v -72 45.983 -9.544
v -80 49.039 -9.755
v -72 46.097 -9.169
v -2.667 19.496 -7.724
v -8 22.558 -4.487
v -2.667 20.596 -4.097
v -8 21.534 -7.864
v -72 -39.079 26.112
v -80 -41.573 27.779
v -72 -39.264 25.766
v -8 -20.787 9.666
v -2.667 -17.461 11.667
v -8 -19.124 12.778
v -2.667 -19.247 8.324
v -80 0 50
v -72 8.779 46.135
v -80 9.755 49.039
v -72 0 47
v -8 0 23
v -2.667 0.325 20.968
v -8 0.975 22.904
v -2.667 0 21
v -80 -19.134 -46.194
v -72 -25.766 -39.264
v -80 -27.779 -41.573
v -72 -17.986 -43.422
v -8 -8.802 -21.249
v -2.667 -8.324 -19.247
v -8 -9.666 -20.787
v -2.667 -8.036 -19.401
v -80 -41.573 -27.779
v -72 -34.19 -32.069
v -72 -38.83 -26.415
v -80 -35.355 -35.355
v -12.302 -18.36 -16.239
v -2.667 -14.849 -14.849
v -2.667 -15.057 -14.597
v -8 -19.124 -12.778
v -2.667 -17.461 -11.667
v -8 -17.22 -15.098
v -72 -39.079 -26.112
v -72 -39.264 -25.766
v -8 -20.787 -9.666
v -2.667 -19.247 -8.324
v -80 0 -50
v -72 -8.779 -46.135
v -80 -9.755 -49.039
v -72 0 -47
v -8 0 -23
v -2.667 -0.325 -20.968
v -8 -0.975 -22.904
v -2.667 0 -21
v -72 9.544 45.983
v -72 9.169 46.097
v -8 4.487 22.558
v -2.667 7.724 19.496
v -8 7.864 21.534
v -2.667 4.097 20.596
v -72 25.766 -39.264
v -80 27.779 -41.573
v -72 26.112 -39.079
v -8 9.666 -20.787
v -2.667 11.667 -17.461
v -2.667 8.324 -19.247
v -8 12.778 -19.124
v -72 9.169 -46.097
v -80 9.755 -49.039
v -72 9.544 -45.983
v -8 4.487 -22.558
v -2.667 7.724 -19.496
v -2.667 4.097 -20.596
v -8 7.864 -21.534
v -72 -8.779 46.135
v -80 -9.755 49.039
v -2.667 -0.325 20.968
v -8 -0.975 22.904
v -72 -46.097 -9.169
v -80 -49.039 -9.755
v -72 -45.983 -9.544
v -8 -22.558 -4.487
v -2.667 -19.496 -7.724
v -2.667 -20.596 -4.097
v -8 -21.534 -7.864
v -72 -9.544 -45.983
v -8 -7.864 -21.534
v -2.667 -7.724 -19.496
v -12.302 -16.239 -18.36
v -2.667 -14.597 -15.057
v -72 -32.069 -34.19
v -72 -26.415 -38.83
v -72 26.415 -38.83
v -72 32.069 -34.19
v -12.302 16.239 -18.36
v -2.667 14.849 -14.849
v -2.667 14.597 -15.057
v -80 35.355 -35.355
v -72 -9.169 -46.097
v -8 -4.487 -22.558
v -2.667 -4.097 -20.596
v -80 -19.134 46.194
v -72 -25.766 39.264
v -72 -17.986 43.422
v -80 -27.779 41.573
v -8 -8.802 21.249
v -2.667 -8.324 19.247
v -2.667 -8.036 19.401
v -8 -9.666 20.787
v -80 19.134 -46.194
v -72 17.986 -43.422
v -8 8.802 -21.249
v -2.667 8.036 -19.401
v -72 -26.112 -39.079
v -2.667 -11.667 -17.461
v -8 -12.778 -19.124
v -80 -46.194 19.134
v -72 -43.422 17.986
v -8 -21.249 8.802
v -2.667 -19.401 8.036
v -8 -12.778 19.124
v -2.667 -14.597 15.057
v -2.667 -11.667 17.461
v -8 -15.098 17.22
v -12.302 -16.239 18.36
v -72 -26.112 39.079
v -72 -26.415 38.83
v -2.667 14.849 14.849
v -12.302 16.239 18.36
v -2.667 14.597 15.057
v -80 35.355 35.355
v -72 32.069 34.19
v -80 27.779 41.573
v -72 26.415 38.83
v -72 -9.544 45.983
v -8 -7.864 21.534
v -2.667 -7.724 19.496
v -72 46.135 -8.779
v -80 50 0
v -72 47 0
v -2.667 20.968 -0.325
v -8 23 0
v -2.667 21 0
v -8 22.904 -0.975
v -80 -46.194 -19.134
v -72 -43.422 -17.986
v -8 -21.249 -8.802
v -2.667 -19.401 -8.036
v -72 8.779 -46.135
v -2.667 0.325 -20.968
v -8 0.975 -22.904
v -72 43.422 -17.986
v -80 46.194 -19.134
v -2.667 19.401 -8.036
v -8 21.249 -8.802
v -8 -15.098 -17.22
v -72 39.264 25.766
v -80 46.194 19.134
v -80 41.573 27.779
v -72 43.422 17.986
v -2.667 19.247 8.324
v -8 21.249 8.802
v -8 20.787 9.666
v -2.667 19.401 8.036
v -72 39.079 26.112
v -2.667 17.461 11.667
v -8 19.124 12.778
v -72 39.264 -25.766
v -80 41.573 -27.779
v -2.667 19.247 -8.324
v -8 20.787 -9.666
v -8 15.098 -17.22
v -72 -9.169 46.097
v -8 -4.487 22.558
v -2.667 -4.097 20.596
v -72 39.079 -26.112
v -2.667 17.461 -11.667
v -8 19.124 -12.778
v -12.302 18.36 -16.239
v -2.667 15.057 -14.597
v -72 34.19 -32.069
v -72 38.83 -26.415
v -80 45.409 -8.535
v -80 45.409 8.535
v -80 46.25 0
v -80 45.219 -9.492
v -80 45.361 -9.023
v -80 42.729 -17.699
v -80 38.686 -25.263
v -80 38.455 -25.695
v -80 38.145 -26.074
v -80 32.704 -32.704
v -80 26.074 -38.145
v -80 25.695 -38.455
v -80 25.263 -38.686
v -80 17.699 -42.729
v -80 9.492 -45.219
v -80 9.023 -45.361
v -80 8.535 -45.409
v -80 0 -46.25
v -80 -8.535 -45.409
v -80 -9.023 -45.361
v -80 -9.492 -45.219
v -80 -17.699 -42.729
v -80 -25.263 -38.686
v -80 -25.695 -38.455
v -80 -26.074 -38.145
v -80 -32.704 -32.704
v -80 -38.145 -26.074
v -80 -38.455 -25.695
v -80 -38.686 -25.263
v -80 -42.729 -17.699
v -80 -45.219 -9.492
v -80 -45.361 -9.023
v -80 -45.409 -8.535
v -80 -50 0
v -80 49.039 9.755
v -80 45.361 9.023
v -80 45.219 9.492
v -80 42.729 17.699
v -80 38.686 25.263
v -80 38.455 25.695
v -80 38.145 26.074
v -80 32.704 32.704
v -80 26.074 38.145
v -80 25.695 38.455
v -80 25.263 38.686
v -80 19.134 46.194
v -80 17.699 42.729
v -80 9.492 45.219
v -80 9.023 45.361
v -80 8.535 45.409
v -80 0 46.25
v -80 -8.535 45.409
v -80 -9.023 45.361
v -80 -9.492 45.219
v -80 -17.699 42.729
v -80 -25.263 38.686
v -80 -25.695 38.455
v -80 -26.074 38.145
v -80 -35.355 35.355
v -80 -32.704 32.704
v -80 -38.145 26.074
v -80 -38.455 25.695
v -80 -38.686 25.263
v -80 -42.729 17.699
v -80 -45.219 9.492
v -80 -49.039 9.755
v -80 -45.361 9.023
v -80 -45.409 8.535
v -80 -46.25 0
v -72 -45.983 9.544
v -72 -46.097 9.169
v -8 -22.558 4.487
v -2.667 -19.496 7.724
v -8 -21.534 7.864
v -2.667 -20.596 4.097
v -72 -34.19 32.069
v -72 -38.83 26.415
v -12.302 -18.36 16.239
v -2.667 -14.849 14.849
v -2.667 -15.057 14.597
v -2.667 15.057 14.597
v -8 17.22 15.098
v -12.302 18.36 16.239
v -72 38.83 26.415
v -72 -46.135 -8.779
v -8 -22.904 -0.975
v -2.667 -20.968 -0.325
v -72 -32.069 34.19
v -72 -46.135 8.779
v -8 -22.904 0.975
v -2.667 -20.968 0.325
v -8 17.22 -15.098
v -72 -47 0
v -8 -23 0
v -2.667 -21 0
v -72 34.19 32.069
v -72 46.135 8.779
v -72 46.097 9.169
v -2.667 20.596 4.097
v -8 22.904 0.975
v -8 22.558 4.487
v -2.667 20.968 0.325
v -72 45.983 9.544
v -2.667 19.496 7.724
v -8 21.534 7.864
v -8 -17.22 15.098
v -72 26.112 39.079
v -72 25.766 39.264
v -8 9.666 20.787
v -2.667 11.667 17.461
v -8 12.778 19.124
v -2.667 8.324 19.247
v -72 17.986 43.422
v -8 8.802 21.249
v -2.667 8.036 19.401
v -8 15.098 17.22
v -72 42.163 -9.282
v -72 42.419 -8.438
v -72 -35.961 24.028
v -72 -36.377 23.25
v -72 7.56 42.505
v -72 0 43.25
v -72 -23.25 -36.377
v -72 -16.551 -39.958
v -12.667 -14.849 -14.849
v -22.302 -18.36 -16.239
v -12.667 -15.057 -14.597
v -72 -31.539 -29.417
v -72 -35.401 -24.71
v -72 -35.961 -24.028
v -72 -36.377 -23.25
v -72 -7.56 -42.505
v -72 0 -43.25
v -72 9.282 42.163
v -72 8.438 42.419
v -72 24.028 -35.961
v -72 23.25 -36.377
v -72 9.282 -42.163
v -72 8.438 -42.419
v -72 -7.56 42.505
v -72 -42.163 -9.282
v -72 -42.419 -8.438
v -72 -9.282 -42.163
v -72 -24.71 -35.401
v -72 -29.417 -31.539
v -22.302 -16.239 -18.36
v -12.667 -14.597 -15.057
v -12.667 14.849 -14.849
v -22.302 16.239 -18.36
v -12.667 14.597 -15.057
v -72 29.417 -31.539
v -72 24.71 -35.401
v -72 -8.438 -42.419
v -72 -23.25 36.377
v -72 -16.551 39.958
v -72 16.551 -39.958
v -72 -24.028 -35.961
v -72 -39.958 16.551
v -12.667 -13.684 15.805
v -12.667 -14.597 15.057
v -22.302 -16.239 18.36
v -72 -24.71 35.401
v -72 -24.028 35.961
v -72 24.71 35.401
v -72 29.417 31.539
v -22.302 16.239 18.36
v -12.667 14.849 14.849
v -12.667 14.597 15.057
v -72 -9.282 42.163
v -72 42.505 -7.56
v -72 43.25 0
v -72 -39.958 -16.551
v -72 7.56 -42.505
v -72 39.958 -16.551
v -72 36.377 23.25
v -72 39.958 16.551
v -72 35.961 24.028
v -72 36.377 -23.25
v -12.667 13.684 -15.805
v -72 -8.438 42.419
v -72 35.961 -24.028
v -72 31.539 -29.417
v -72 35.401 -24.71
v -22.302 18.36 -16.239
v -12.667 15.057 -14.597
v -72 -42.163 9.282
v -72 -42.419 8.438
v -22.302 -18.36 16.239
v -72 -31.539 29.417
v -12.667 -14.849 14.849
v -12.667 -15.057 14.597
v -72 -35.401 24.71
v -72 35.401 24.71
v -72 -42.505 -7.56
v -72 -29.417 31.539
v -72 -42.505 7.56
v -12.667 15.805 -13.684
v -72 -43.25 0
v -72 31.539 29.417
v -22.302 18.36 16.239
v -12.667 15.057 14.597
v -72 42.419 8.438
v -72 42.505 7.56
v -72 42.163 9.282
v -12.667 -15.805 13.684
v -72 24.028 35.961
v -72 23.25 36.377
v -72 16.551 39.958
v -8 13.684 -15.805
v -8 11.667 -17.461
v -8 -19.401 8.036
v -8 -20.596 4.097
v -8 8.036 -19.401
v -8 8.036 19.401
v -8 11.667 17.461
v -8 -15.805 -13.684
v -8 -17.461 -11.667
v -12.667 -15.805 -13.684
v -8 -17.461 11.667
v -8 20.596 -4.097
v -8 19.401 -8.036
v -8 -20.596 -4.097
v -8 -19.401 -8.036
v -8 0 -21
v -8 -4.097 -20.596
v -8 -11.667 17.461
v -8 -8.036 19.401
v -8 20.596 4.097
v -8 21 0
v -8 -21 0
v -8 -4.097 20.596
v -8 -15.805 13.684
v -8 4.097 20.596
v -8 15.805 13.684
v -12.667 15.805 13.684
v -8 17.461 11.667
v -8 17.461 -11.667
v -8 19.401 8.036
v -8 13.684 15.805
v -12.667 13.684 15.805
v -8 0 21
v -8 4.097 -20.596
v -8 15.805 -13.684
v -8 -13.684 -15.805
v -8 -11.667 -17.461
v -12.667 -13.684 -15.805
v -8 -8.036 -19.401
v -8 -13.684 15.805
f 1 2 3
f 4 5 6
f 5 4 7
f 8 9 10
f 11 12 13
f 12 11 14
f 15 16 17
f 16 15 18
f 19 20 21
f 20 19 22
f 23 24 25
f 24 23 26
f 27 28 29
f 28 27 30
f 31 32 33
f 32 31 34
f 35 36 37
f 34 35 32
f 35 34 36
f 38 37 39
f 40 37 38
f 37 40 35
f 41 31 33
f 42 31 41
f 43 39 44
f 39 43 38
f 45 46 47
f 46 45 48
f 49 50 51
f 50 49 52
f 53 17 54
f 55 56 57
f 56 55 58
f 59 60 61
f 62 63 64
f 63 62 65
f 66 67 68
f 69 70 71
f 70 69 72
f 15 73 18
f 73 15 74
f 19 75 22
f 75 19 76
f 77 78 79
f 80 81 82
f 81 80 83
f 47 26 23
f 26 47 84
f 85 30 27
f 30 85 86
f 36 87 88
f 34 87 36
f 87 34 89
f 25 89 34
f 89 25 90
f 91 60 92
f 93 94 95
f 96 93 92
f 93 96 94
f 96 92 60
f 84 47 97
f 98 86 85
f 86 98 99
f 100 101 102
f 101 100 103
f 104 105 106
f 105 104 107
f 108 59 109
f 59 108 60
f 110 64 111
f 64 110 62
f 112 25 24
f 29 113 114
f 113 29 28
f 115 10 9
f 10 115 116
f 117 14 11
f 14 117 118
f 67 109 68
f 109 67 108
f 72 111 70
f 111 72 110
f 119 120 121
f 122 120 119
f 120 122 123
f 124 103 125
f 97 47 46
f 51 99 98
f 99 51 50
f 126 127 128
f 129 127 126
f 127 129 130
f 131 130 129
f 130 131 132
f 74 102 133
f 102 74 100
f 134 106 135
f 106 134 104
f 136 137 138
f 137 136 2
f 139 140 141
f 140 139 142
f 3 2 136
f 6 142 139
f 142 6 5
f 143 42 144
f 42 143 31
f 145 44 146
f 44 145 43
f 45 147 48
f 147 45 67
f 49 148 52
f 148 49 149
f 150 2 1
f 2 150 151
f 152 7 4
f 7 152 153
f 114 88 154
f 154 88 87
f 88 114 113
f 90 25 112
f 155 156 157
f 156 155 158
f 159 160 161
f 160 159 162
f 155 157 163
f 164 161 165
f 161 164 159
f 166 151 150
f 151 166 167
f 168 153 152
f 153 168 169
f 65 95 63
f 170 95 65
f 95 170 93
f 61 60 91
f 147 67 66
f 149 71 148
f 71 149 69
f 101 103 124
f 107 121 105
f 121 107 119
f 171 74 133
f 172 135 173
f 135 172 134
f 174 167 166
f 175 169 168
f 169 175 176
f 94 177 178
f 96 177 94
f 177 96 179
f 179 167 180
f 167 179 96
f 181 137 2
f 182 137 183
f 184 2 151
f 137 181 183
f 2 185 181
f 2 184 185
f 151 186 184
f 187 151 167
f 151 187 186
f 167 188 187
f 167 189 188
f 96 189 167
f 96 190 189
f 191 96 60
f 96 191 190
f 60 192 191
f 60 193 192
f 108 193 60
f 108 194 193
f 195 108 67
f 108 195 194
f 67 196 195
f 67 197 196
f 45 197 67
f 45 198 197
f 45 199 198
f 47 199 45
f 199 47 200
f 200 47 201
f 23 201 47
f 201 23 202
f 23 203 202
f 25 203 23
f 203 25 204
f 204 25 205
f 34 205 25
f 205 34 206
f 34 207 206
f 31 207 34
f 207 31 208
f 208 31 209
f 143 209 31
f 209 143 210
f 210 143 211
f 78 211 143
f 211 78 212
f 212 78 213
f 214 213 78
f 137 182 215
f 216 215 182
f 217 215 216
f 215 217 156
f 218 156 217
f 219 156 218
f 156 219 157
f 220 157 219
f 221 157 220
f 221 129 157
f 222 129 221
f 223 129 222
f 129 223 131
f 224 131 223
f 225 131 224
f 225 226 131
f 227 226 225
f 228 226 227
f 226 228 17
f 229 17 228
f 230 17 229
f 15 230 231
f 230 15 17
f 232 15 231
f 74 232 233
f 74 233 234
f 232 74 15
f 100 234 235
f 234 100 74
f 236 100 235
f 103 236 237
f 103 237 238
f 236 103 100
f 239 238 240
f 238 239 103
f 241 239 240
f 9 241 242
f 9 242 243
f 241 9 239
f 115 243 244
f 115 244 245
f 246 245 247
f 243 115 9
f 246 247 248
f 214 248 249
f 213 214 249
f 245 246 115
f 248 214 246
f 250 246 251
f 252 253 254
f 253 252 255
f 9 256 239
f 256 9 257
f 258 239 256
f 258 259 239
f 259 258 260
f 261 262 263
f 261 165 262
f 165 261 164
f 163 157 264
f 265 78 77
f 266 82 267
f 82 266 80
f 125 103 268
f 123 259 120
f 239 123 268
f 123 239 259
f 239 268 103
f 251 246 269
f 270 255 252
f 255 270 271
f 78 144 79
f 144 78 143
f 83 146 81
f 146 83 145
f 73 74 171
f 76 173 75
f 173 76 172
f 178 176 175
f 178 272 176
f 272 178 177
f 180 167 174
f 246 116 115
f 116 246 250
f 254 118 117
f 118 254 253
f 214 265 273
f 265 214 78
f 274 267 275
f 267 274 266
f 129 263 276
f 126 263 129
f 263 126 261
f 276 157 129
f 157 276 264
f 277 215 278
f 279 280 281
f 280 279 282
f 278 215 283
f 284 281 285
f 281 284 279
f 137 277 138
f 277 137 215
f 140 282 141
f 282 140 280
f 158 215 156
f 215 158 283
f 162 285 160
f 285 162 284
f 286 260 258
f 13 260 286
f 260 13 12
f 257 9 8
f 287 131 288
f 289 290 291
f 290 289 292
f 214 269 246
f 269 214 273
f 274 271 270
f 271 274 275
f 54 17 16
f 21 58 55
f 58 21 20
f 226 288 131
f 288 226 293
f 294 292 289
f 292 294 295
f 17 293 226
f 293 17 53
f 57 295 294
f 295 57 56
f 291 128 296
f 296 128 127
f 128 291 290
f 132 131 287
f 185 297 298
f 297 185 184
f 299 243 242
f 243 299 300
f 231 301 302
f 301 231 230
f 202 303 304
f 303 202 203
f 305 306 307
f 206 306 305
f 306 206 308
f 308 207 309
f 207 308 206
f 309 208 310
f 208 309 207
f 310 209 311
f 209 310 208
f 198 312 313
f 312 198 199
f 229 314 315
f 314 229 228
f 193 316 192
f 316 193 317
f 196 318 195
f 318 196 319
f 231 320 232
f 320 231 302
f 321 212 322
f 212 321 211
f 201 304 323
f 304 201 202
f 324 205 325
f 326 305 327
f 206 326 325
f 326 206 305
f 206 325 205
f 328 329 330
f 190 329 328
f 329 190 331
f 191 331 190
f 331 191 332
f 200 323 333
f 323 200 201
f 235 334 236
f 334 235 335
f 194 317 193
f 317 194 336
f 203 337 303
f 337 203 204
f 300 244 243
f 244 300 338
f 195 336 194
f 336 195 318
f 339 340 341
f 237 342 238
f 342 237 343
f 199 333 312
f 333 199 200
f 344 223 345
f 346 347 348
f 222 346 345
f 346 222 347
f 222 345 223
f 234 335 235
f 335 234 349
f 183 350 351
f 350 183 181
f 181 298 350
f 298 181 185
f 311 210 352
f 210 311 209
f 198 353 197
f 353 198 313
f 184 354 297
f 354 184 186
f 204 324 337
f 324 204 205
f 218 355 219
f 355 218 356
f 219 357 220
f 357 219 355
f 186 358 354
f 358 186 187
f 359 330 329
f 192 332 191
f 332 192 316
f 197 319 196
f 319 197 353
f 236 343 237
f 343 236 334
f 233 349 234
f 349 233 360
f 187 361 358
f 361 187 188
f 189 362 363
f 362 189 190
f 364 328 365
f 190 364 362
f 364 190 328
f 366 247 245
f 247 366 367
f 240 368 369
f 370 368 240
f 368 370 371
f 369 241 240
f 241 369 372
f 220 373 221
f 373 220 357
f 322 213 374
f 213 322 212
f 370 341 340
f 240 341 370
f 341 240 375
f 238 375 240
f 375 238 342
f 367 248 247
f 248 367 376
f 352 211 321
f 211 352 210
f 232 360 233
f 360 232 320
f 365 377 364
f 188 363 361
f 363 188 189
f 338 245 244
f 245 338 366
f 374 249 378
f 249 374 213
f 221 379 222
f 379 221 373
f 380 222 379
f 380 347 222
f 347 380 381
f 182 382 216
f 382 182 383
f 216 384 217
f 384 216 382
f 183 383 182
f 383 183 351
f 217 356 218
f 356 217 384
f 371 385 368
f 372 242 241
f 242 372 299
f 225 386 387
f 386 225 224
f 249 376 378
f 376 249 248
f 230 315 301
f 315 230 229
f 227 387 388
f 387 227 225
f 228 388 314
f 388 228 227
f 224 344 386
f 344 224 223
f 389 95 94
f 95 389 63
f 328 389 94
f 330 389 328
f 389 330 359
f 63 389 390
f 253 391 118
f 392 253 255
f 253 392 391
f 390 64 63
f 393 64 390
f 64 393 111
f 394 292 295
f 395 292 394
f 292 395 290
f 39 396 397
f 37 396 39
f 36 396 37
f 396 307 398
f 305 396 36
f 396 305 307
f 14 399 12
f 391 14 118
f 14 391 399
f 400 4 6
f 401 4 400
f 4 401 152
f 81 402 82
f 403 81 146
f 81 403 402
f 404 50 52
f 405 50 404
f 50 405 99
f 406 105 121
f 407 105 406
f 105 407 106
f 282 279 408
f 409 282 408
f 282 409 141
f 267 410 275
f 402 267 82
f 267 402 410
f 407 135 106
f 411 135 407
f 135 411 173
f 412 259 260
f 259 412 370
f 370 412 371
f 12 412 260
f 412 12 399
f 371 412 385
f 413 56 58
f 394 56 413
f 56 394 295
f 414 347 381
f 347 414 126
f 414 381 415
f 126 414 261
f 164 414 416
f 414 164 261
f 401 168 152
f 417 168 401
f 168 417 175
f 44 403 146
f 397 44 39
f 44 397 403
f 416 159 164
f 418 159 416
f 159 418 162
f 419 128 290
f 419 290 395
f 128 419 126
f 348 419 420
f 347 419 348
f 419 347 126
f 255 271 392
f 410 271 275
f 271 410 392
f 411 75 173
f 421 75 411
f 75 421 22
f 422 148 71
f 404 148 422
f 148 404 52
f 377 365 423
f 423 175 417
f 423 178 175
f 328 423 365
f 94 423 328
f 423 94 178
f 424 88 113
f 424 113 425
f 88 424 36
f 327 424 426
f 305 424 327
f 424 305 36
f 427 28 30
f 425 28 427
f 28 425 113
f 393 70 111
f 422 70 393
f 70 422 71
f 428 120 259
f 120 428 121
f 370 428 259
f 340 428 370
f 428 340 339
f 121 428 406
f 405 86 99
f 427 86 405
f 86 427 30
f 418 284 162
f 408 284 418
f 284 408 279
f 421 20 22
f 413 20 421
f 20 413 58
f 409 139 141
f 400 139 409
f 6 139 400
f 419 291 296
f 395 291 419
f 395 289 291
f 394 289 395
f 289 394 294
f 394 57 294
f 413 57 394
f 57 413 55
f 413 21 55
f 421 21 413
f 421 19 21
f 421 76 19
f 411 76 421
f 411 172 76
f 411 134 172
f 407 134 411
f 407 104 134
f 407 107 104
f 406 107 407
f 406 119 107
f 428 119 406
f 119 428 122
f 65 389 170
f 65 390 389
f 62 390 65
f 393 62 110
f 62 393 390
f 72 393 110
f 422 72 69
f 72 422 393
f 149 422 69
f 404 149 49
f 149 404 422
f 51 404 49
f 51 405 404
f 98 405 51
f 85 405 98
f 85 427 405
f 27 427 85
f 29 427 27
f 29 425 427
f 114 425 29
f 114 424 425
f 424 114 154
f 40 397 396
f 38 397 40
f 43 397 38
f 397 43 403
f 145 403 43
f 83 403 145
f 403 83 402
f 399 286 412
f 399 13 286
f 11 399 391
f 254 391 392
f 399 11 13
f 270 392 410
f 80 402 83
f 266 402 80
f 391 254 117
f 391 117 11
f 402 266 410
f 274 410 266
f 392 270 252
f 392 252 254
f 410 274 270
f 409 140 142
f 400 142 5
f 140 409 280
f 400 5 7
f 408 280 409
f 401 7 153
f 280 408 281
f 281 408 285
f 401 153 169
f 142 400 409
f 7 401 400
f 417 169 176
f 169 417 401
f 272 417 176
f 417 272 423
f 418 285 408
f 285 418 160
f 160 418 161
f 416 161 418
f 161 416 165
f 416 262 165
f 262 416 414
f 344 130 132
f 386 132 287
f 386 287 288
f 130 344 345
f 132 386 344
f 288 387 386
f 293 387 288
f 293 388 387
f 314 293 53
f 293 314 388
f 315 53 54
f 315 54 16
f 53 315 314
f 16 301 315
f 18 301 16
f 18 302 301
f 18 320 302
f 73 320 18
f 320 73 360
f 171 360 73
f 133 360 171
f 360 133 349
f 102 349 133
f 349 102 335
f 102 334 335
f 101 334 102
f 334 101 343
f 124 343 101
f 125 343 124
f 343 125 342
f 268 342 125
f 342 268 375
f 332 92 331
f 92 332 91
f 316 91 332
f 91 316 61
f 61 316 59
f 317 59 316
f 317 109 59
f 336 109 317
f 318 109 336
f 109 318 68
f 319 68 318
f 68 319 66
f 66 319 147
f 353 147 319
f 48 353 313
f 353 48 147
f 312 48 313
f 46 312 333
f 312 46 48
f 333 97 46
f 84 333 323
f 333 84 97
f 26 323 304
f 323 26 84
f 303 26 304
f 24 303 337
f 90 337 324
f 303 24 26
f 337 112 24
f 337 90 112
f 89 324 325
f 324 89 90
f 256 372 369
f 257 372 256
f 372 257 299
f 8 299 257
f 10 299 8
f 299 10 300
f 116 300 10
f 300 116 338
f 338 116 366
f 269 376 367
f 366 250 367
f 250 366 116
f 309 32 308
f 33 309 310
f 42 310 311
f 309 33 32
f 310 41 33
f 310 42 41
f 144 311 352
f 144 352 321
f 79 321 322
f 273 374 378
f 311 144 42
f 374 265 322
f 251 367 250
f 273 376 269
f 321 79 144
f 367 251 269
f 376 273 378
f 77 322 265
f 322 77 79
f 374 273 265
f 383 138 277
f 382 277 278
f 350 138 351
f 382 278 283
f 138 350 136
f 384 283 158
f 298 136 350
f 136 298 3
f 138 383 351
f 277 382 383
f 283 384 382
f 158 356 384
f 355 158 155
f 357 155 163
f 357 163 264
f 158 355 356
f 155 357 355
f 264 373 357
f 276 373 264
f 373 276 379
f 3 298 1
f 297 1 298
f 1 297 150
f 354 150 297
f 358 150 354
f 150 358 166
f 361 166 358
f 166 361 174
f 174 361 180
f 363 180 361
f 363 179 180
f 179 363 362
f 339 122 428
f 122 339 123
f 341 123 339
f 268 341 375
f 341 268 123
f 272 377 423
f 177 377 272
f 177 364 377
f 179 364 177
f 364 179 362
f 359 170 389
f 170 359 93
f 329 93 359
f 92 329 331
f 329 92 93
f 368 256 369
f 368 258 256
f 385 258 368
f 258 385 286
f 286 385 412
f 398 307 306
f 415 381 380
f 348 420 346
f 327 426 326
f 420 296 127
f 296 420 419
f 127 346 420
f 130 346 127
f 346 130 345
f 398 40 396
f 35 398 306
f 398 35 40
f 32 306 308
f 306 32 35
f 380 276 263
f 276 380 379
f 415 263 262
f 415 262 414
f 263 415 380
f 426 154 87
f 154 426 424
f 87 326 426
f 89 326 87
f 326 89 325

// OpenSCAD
small_r = 20;
big_r = 50;
length = 80;
$fn=32;

module cone()
{
	rotate(v = [0, 0, 1], a = -90)
		rotate(v = [1, 0, 0], a = 90)
			cylinder(r1 = small_r, r2 = big_r, h = length);
}

module hollow_cone()
{
	difference() {
		cone();
		translate(v = [-10, 0, 0])
			cone();
	}
}

module central_circle()
{
	translate(v = [20, 0, 0])
		rotate(v = [0, 0, 1], a = -90)
			rotate(v = [1, 0, 0], a = 90)
				cylinder(r1 = small_r * 1.05, r2 = small_r * 1.05, h = length * 2);
}


module hollow_cone_with_circle_window()
{
	difference() {
		hollow_cone();
		central_circle();
	}
}

module strut_cutter()
{
	cube(size = [200, 3, 200], center = true);
}

module struts()
{
	intersection() {
		hollow_cone_with_circle_window();
		strut_cutter();
	}
}

/* hollow_cone_with_circle_window(); */

module hollow_circles()
{
	difference() {
		hollow_cone_with_circle_window();
		translate(v = [ -length * 0.5, 0, 0 ])
			cube(size = [ length * 0.8, big_r * 0.95 * 2.0, big_r * 0.95 * 2.0 ], center = true);
	}
}

rotate(v = [1, 0, 0], a = 45) {
	hollow_circles();
	struts();
	rotate(v = [1, 0, 0], a = 90)
		struts();
}
